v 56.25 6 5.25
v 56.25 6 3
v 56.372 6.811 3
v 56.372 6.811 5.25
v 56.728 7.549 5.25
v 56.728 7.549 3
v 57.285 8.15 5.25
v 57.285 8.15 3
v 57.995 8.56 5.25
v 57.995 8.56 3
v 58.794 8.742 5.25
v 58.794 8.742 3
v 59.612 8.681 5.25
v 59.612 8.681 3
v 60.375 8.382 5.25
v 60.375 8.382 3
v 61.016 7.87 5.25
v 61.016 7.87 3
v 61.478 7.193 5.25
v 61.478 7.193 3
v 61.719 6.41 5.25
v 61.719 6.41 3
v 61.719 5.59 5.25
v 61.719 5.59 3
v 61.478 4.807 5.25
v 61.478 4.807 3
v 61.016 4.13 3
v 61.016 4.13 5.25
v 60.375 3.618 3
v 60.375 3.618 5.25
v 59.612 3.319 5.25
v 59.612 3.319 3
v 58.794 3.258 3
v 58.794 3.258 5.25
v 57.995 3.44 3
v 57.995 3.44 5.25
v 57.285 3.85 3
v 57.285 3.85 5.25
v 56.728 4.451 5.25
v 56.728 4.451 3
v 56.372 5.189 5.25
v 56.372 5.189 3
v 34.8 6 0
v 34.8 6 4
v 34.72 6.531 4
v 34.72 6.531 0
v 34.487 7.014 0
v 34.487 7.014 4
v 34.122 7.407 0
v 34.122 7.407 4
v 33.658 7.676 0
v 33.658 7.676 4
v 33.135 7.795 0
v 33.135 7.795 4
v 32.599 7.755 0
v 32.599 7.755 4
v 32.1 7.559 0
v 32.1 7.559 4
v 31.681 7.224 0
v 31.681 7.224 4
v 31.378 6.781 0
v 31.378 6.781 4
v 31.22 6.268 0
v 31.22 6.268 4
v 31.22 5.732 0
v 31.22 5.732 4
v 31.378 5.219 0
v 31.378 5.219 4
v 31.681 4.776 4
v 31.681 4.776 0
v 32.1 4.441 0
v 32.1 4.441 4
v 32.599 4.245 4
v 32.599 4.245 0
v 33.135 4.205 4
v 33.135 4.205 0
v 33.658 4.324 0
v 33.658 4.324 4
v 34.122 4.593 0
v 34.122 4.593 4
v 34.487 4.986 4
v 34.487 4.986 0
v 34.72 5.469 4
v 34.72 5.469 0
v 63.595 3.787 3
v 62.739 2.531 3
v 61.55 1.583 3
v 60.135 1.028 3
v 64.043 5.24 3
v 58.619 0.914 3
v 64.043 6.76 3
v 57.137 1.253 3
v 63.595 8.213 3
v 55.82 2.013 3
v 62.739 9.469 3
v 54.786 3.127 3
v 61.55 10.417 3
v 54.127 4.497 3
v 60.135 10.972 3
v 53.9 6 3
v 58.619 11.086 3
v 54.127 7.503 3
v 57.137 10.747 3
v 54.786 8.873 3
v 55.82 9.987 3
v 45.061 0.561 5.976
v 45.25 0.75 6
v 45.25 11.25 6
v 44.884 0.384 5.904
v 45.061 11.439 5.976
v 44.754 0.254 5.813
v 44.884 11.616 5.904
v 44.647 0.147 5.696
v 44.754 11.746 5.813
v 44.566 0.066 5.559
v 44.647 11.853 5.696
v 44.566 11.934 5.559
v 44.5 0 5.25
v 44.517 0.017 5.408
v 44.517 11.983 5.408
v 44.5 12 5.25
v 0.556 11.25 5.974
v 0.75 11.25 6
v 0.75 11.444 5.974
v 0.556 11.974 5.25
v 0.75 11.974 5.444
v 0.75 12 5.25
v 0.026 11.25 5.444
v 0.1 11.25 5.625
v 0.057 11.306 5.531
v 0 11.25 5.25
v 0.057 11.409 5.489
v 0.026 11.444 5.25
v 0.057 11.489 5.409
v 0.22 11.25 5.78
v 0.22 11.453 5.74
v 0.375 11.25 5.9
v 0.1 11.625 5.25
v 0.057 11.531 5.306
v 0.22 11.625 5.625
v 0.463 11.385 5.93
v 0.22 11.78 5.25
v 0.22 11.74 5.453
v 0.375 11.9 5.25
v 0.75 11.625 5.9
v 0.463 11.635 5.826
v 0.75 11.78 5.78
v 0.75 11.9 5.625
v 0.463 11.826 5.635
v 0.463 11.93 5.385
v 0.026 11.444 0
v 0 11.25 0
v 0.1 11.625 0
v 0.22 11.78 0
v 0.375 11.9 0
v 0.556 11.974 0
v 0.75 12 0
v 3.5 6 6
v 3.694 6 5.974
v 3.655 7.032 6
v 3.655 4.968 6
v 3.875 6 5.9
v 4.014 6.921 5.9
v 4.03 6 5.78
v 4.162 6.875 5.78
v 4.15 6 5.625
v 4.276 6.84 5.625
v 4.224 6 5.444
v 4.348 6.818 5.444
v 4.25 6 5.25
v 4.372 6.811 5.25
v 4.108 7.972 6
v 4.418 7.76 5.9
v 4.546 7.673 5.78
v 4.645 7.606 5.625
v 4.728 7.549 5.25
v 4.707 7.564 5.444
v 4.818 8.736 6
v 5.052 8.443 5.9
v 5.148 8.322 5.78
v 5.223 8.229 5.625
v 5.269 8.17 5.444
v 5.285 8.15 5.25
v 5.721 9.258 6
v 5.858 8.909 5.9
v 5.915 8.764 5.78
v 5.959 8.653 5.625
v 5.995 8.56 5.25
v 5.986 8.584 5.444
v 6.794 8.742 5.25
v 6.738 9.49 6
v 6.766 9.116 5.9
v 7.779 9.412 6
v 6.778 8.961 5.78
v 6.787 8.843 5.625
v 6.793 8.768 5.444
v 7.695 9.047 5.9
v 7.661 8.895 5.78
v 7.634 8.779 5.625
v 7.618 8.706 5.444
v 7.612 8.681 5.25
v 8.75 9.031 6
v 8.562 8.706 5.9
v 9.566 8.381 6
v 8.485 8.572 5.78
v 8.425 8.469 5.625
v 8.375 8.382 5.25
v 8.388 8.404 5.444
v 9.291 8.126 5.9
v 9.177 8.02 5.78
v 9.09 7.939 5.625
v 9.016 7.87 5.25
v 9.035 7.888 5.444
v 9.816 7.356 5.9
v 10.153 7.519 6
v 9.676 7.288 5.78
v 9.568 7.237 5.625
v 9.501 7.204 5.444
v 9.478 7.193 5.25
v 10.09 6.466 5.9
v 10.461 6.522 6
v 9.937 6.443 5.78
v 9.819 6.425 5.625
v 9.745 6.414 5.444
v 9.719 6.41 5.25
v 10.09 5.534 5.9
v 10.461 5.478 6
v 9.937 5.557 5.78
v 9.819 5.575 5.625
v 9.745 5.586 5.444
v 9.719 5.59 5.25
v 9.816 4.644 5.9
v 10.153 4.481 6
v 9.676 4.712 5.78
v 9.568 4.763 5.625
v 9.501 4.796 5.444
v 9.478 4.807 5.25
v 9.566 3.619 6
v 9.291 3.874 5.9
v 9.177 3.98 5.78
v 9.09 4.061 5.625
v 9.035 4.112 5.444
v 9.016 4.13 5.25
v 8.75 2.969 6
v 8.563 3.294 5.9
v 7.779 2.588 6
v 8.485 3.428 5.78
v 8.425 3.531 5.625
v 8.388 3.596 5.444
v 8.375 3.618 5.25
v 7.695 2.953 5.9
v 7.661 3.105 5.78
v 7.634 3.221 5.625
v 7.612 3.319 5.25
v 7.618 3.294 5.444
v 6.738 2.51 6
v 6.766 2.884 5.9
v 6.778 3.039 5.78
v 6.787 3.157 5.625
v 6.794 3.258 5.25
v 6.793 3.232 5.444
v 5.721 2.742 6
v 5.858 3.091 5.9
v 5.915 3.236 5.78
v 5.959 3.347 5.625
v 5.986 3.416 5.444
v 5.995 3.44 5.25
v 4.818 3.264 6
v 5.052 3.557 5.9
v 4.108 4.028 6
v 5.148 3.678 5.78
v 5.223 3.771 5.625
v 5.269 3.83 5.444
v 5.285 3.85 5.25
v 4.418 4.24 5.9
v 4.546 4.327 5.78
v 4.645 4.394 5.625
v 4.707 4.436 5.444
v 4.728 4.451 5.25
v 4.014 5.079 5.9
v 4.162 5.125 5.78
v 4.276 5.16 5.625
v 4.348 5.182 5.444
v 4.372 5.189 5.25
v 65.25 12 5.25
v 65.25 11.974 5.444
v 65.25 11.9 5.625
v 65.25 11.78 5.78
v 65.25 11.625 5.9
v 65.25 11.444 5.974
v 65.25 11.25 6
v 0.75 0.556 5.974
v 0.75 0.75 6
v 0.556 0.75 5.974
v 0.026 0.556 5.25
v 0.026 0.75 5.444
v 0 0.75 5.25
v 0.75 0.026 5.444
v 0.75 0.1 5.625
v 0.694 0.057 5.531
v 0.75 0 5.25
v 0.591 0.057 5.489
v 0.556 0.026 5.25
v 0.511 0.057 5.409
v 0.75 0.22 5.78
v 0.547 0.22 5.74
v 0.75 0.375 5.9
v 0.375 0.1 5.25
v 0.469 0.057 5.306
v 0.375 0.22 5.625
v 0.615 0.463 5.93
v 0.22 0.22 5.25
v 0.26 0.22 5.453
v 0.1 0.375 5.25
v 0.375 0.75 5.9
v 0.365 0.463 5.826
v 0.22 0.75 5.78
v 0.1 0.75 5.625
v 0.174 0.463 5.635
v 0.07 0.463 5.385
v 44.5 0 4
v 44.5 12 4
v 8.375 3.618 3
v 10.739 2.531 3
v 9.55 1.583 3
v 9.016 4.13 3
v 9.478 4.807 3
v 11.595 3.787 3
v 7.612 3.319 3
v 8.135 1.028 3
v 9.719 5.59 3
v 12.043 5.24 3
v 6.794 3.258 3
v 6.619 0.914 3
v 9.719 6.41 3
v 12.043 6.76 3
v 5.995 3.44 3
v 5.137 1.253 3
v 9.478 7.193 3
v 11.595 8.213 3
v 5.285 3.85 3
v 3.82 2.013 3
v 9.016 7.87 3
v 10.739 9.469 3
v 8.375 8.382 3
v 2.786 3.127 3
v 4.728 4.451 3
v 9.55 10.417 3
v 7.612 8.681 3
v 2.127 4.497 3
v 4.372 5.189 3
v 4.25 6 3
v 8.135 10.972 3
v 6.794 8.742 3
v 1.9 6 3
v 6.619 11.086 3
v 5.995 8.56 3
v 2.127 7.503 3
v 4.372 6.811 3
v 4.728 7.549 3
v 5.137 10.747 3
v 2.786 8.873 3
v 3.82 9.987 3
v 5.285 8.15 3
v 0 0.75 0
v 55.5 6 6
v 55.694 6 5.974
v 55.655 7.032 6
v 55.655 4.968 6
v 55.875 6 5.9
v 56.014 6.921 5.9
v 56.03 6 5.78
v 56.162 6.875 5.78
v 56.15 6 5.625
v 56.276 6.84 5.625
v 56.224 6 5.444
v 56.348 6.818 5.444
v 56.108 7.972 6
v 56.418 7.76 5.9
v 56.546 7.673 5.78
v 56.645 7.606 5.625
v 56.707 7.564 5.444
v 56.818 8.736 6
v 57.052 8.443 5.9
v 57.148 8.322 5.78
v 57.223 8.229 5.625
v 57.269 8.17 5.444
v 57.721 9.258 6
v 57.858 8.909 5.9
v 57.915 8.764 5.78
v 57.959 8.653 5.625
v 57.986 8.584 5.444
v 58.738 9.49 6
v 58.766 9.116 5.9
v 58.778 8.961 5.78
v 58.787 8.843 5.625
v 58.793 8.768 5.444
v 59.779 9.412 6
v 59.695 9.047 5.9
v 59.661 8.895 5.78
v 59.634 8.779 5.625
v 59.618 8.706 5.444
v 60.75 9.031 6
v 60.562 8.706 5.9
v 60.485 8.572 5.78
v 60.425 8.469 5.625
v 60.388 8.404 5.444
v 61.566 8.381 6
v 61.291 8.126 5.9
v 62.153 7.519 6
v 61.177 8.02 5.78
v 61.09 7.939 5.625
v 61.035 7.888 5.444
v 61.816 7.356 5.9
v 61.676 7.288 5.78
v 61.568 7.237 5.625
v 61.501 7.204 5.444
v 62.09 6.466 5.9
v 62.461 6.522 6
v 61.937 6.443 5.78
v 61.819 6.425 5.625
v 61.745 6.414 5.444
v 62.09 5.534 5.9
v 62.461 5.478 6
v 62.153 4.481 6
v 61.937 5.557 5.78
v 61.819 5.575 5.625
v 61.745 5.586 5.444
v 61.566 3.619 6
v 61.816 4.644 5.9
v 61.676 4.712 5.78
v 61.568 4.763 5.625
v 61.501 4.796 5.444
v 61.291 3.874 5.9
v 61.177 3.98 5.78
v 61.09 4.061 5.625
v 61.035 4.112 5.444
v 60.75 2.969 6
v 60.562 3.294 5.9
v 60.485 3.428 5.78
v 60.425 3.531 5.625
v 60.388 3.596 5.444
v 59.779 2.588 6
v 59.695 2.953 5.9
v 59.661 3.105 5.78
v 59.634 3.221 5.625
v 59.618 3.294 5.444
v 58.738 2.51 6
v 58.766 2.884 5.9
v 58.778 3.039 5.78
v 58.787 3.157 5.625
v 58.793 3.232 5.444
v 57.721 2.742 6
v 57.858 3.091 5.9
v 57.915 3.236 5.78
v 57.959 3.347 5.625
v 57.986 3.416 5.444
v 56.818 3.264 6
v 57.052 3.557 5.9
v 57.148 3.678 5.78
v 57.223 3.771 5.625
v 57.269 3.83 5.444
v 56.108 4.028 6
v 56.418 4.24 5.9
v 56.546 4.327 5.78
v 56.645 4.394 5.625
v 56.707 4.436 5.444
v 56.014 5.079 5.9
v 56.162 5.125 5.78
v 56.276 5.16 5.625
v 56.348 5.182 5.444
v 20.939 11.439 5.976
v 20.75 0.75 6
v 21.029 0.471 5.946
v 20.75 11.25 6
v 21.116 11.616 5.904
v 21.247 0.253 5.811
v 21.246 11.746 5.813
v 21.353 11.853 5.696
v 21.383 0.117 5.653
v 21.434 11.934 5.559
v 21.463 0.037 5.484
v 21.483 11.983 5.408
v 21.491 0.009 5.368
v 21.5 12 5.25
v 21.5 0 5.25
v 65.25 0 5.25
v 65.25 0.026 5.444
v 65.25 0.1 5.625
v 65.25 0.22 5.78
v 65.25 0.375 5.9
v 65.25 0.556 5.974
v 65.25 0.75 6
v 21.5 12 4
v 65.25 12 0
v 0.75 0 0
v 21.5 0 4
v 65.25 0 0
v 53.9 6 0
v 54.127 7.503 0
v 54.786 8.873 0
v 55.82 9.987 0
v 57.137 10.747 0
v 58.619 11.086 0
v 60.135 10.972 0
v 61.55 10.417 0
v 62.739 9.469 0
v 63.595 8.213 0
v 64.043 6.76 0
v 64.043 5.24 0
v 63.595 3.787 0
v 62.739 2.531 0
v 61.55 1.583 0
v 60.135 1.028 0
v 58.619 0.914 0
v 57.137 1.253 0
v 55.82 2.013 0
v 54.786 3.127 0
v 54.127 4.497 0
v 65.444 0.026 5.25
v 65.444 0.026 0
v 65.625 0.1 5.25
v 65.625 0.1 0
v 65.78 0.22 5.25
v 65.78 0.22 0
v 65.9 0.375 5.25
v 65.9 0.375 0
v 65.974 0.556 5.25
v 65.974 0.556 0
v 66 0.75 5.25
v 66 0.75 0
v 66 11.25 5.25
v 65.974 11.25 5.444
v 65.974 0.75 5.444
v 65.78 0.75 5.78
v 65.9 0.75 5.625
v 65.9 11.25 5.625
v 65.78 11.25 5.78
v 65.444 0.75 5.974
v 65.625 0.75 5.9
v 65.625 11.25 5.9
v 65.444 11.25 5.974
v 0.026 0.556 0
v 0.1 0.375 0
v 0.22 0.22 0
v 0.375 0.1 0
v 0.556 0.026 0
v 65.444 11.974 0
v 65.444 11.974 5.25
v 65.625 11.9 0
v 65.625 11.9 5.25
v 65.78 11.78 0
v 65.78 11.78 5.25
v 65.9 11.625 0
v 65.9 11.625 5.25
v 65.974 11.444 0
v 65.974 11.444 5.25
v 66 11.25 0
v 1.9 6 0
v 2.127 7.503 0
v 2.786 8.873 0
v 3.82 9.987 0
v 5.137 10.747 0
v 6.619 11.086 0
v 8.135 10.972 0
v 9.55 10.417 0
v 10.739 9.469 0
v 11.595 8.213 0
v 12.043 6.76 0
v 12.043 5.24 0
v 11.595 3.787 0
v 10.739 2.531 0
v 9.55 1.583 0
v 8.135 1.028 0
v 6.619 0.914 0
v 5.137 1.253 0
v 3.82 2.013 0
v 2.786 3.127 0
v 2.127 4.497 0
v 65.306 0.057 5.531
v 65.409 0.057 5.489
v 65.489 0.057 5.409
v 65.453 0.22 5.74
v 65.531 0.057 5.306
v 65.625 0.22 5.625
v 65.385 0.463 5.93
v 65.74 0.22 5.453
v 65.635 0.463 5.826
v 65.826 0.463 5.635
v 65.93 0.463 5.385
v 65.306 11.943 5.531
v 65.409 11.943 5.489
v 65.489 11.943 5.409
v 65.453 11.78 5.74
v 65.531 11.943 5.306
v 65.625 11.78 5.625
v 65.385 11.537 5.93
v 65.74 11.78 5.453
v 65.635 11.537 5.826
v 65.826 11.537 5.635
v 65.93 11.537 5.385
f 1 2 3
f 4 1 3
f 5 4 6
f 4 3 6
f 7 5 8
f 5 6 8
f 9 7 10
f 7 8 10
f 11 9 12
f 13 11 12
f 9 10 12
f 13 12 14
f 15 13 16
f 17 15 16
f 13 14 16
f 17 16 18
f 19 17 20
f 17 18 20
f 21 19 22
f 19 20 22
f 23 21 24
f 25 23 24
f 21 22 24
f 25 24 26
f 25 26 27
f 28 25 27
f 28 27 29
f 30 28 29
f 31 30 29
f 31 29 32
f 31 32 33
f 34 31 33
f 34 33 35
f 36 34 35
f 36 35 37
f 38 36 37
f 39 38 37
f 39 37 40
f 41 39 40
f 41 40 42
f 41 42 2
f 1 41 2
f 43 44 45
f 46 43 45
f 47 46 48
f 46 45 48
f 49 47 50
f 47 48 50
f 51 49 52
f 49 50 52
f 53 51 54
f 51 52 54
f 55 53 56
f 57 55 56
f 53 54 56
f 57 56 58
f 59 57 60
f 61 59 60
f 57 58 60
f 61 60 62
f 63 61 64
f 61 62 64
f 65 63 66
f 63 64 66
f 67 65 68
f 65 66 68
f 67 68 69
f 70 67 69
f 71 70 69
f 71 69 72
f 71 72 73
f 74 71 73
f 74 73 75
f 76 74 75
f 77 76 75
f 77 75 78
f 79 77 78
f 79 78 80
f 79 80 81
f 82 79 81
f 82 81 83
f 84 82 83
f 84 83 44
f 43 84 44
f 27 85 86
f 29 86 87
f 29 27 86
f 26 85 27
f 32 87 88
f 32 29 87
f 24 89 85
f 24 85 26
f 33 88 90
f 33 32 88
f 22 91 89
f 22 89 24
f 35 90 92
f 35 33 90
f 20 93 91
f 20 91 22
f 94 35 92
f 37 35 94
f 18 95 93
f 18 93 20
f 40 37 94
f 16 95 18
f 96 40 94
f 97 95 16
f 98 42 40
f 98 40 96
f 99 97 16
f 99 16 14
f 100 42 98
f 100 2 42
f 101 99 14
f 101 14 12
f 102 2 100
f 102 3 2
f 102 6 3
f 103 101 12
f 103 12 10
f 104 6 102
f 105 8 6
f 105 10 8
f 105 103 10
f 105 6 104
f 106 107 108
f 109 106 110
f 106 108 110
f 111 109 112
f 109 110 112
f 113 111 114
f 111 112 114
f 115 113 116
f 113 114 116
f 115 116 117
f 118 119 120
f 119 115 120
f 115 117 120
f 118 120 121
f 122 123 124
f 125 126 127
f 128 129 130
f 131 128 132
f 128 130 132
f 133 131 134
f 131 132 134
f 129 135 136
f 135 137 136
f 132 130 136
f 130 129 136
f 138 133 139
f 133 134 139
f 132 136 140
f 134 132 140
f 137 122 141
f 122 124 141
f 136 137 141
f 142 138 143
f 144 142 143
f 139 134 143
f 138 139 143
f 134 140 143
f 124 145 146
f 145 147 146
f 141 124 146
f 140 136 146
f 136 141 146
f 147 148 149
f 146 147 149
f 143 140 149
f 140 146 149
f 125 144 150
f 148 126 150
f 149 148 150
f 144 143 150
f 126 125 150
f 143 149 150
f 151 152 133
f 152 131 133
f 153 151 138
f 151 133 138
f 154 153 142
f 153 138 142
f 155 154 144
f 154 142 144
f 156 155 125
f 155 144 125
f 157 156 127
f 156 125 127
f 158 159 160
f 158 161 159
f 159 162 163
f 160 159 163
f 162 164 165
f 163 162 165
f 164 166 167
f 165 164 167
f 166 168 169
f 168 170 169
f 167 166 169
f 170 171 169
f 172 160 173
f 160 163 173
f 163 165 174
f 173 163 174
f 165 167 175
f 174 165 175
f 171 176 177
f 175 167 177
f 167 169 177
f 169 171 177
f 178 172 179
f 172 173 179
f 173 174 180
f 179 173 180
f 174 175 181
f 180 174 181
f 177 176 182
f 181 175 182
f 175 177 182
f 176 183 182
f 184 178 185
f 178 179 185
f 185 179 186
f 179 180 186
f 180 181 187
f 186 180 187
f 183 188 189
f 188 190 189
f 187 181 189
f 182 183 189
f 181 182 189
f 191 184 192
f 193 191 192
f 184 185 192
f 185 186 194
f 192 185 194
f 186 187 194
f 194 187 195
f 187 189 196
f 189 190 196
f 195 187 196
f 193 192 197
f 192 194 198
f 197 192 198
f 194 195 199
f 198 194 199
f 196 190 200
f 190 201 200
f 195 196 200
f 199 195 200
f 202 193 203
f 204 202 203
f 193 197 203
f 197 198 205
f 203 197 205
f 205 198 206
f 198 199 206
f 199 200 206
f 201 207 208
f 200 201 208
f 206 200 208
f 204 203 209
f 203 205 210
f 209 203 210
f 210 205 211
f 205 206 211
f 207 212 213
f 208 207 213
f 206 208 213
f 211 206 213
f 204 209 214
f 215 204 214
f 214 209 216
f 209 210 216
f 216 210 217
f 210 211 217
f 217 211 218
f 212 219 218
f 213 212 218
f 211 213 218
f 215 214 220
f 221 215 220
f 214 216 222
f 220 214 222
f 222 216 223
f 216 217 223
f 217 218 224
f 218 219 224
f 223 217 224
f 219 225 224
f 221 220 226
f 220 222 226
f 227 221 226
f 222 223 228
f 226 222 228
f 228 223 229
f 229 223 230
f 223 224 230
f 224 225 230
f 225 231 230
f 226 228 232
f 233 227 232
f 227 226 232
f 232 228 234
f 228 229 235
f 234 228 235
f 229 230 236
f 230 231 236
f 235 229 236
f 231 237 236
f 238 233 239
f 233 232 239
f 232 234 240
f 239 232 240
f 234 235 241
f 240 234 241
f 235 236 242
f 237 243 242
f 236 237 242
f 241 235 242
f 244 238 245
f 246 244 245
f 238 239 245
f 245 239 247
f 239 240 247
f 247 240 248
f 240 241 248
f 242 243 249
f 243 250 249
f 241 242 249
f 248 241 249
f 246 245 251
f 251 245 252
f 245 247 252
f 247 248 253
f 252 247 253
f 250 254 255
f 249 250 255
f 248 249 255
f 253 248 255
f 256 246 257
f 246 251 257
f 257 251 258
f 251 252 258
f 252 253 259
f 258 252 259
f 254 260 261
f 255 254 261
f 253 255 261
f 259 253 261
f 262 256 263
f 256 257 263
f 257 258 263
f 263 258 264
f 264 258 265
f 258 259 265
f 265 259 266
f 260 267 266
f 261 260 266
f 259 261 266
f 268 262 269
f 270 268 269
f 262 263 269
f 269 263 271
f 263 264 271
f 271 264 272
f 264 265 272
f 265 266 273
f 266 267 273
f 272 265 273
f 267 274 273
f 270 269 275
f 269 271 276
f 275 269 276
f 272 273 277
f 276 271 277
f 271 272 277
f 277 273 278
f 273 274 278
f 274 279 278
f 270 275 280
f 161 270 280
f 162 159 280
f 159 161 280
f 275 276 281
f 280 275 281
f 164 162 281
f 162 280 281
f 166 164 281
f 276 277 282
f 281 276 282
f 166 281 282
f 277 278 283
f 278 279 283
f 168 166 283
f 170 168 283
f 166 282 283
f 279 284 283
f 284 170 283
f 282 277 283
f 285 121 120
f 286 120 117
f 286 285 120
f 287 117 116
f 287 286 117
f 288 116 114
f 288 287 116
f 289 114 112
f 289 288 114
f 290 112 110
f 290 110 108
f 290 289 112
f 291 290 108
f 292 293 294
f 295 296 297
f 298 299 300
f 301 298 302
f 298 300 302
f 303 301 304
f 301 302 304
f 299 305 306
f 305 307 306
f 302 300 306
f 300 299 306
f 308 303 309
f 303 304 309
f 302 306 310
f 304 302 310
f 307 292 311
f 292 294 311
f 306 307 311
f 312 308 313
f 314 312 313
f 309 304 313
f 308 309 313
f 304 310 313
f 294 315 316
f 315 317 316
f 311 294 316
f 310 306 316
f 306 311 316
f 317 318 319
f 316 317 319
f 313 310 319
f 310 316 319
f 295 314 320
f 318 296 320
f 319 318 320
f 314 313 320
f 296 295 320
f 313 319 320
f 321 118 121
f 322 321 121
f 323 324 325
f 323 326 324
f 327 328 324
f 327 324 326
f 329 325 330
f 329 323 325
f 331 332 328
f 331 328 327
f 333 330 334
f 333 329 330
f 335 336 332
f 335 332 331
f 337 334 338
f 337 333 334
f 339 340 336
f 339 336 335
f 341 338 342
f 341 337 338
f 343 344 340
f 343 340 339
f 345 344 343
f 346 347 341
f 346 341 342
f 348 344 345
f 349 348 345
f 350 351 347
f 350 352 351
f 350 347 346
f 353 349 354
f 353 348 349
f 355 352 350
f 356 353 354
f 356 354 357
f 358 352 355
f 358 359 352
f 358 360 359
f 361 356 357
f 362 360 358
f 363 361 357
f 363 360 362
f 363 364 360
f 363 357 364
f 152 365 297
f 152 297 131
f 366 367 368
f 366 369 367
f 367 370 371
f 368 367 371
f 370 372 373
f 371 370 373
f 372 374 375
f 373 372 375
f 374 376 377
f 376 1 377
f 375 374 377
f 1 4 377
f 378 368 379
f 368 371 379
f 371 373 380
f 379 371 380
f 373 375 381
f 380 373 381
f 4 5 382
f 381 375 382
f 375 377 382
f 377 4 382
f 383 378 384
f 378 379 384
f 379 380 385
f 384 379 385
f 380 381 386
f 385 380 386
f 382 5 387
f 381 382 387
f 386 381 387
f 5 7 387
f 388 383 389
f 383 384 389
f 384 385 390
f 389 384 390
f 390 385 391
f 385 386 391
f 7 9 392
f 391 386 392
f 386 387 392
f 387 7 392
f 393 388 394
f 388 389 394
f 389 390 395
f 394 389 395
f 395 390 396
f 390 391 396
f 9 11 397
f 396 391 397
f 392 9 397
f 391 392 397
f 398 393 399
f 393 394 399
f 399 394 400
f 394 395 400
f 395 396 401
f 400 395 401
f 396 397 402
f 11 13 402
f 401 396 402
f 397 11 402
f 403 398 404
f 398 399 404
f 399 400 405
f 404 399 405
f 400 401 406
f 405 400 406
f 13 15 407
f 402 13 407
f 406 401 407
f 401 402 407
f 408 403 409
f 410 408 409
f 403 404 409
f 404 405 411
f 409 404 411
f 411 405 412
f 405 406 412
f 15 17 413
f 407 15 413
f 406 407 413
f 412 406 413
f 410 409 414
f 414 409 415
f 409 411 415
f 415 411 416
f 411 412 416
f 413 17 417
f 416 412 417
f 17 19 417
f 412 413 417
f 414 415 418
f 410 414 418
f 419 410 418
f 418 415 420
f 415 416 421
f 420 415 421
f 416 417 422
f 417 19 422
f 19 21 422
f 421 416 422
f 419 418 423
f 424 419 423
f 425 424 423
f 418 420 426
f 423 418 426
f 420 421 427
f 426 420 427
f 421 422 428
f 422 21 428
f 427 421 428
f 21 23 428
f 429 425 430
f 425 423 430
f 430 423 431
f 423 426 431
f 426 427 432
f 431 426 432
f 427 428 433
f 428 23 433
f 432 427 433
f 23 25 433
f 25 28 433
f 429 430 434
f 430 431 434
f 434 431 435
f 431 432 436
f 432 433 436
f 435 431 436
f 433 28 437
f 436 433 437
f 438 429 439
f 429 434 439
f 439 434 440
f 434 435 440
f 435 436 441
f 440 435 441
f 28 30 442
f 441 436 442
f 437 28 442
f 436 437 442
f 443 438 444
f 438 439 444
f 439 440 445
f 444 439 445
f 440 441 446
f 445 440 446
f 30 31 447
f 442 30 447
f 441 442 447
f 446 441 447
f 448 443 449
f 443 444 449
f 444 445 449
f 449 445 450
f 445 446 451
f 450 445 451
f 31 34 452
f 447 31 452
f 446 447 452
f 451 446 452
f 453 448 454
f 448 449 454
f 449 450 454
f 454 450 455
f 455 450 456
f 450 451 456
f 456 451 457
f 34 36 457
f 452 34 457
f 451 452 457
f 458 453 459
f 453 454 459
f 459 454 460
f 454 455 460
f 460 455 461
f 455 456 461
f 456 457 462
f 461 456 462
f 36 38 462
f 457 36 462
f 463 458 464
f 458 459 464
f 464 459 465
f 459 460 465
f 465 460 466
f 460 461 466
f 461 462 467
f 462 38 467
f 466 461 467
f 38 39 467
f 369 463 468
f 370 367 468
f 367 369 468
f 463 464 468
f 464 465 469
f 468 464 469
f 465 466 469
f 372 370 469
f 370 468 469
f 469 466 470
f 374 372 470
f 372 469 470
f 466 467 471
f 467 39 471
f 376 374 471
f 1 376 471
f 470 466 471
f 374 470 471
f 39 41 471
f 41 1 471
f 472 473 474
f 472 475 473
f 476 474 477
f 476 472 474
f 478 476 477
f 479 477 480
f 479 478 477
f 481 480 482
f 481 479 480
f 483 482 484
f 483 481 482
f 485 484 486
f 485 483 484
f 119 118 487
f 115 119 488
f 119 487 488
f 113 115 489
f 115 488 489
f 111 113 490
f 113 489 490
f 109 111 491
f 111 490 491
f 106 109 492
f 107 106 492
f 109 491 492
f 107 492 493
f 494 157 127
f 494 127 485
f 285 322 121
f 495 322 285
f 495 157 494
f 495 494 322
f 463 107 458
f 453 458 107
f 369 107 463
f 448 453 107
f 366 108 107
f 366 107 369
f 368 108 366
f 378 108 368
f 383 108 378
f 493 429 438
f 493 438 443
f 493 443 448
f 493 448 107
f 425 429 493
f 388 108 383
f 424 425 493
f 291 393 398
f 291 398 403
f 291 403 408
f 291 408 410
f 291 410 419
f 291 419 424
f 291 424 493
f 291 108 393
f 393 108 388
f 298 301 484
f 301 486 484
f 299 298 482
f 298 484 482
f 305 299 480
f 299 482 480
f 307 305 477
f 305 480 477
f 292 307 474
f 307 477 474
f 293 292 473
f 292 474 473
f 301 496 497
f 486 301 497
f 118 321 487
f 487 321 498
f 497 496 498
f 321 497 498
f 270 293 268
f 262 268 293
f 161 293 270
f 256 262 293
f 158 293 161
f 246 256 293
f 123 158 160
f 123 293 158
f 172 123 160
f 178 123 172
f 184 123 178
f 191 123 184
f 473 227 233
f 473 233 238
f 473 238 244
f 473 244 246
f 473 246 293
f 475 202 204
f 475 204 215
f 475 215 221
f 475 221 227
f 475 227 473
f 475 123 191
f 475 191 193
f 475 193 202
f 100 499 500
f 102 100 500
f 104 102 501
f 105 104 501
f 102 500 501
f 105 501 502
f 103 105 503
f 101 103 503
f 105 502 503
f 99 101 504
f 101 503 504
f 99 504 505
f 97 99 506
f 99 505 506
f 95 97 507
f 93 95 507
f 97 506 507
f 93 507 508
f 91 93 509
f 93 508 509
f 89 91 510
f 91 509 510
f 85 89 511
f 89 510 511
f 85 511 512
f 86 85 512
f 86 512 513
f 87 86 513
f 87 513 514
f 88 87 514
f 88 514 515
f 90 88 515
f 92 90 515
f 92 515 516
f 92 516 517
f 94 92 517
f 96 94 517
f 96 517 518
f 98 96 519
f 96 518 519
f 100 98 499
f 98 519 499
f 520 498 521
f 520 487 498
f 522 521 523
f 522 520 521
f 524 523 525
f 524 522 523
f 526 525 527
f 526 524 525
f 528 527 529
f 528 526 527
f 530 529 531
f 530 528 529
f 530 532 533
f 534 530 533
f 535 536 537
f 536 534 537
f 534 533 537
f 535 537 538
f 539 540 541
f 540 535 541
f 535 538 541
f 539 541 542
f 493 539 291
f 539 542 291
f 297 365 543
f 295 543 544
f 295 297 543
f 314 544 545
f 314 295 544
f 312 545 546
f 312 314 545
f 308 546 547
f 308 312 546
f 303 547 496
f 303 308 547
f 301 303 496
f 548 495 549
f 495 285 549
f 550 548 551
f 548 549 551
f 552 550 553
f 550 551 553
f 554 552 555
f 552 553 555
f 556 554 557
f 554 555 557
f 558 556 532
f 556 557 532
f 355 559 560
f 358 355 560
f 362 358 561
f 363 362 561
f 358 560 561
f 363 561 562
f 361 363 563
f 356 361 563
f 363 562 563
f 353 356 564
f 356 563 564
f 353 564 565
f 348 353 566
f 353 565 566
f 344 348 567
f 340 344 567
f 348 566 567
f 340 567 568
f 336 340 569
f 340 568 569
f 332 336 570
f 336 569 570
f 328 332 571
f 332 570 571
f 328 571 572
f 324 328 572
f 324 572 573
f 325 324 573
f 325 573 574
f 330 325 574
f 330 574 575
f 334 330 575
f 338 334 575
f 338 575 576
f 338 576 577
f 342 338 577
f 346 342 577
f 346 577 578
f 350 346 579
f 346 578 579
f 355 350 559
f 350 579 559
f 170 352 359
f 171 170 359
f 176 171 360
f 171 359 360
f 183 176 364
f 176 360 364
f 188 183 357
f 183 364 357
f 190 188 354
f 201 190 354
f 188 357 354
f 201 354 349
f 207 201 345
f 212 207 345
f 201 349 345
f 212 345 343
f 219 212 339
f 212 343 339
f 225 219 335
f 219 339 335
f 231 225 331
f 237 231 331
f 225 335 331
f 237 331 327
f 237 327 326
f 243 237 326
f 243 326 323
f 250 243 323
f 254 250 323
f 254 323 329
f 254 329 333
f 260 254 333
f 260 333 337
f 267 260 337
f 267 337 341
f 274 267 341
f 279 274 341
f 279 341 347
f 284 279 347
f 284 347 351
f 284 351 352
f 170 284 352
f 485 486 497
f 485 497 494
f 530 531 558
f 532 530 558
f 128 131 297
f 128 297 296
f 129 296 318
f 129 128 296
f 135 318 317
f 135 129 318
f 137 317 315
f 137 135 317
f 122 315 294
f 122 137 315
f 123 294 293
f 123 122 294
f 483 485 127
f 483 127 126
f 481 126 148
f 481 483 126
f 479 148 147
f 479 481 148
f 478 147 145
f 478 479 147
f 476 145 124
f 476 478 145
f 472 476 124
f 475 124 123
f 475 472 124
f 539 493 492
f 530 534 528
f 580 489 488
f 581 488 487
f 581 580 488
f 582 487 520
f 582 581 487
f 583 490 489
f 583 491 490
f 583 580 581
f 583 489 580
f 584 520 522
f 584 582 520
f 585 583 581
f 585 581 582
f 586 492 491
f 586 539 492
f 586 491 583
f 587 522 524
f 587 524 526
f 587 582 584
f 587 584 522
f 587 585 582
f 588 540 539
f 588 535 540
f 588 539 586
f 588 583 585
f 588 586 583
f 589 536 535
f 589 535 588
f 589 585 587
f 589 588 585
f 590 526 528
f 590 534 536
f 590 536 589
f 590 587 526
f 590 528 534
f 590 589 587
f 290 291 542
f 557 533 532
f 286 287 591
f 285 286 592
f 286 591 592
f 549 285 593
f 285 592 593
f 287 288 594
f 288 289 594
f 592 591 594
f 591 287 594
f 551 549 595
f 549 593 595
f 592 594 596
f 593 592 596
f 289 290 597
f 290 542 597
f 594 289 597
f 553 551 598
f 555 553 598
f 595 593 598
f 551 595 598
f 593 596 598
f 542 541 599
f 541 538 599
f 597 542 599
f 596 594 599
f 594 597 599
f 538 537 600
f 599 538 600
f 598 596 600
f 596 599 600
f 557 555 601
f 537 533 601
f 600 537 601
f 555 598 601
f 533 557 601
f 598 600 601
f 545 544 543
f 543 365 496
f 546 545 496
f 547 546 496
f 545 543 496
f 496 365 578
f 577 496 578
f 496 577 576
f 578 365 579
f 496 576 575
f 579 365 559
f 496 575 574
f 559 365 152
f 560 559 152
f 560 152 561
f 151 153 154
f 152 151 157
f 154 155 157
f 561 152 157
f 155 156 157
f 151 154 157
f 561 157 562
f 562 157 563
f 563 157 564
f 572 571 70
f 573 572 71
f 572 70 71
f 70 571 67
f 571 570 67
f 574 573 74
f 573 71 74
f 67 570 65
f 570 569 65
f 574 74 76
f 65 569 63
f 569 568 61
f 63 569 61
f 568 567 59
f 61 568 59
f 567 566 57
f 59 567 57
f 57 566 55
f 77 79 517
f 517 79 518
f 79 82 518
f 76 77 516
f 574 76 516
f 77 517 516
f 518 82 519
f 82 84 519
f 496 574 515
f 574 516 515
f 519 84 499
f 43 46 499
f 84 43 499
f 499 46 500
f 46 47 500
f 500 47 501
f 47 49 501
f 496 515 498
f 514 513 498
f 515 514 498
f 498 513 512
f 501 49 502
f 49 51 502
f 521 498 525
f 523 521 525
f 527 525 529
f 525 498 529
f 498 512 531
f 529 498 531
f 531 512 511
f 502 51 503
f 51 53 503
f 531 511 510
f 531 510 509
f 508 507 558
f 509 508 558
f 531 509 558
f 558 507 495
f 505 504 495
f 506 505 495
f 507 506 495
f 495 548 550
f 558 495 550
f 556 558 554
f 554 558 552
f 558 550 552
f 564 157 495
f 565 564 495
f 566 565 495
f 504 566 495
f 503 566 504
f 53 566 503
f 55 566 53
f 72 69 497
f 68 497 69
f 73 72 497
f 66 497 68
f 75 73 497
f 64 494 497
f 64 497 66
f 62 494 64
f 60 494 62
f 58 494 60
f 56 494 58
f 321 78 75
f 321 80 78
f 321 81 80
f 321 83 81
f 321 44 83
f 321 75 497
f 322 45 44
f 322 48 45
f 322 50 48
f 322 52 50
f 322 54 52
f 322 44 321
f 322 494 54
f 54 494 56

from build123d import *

# Parameters (mm, degrees)
ESQUISSE2_W             = 66
ESQUISSE2_H             = 12
BOSS_EXTRU_1_DEPTH      = 6
ESQUISSE3_W             = 23
ESQUISSE3_H             = 12
ENL_V_MAT_EXTRU_1_DEPTH = 2
ESQUISSE4_R             = 1.8
ENL_V_MAT_EXTRU_2_DEPTH = 5
ESQUISSE5_R             = 2.75
ENL_V_MAT_EXTRU_3_DEPTH = 7
ESQUISSE6_R             = 5.1
ENL_V_MAT_EXTRU_4_DEPTH = 3
CONG_1_R                = 0.75


with BuildPart() as part:
    # Esquisse2 → Boss.-Extru.1 (new body)
    with BuildSketch(Plane.XY):
        with Locations((33, 6)):
            Rectangle(ESQUISSE2_W, ESQUISSE2_H)
    extrude(amount=BOSS_EXTRU_1_DEPTH)

    # Esquisse3 → Enlèv. mat.-Extru.1 (cut)
    with BuildSketch(Plane.XY.offset(6)):
        with Locations((33, 6)):
            Rectangle(ESQUISSE3_W, ESQUISSE3_H)
    extrude(amount=-ENL_V_MAT_EXTRU_1_DEPTH, mode=Mode.SUBTRACT)

    # Esquisse4 → Enlèv. mat.-Extru.2 (cut, through all)
    with BuildSketch(Plane.XY.offset(4)):
        with Locations((33, 6)):
            Circle(ESQUISSE4_R)
    extrude(amount=-ENL_V_MAT_EXTRU_2_DEPTH, mode=Mode.SUBTRACT)

    # Esquisse5 → Enlèv. mat.-Extru.3 (cut, through all)
    with BuildSketch(Plane(origin=(0, 0, 0), x_dir=(-1, 0, 0), z_dir=(0, 0, -1))):
        with Locations((-59, 6)):
            Circle(ESQUISSE5_R)
        with Locations((-7, 6)):
            Circle(ESQUISSE5_R)
    extrude(amount=-ENL_V_MAT_EXTRU_3_DEPTH, mode=Mode.SUBTRACT)

    # Esquisse6 → Enlèv. mat.-Extru.4 (cut)
    with BuildSketch(Plane(origin=(0, 0, 0), x_dir=(-1, 0, 0), z_dir=(0, 0, -1))):
        with Locations((-59, 6)):
            Circle(ESQUISSE6_R)
        with Locations((-7, 6)):
            Circle(ESQUISSE6_R)
    extrude(amount=-ENL_V_MAT_EXTRU_4_DEPTH, mode=Mode.SUBTRACT)

    # Congé1
    cong_1_edges = [part.edges().sort_by_distance(p)[0] for p in [
        (66, 6, 6),
        (55.25, 12, 6),
        (55.25, 0, 6),
        (10.75, 12, 6),
        (21.5, 6, 6),
        (44.5, 6, 6),
        (61.75, 6, 6),
        (0, 6, 6),
        (9.75, 6, 6),
        (10.75, 0, 6),
        (0, 12, 3),
        (66, 12, 3),
        (66, 0, 3),
        (0, 0, 3),
    ]]
    fillet(cong_1_edges, radius=CONG_1_R)


solid = part.part
